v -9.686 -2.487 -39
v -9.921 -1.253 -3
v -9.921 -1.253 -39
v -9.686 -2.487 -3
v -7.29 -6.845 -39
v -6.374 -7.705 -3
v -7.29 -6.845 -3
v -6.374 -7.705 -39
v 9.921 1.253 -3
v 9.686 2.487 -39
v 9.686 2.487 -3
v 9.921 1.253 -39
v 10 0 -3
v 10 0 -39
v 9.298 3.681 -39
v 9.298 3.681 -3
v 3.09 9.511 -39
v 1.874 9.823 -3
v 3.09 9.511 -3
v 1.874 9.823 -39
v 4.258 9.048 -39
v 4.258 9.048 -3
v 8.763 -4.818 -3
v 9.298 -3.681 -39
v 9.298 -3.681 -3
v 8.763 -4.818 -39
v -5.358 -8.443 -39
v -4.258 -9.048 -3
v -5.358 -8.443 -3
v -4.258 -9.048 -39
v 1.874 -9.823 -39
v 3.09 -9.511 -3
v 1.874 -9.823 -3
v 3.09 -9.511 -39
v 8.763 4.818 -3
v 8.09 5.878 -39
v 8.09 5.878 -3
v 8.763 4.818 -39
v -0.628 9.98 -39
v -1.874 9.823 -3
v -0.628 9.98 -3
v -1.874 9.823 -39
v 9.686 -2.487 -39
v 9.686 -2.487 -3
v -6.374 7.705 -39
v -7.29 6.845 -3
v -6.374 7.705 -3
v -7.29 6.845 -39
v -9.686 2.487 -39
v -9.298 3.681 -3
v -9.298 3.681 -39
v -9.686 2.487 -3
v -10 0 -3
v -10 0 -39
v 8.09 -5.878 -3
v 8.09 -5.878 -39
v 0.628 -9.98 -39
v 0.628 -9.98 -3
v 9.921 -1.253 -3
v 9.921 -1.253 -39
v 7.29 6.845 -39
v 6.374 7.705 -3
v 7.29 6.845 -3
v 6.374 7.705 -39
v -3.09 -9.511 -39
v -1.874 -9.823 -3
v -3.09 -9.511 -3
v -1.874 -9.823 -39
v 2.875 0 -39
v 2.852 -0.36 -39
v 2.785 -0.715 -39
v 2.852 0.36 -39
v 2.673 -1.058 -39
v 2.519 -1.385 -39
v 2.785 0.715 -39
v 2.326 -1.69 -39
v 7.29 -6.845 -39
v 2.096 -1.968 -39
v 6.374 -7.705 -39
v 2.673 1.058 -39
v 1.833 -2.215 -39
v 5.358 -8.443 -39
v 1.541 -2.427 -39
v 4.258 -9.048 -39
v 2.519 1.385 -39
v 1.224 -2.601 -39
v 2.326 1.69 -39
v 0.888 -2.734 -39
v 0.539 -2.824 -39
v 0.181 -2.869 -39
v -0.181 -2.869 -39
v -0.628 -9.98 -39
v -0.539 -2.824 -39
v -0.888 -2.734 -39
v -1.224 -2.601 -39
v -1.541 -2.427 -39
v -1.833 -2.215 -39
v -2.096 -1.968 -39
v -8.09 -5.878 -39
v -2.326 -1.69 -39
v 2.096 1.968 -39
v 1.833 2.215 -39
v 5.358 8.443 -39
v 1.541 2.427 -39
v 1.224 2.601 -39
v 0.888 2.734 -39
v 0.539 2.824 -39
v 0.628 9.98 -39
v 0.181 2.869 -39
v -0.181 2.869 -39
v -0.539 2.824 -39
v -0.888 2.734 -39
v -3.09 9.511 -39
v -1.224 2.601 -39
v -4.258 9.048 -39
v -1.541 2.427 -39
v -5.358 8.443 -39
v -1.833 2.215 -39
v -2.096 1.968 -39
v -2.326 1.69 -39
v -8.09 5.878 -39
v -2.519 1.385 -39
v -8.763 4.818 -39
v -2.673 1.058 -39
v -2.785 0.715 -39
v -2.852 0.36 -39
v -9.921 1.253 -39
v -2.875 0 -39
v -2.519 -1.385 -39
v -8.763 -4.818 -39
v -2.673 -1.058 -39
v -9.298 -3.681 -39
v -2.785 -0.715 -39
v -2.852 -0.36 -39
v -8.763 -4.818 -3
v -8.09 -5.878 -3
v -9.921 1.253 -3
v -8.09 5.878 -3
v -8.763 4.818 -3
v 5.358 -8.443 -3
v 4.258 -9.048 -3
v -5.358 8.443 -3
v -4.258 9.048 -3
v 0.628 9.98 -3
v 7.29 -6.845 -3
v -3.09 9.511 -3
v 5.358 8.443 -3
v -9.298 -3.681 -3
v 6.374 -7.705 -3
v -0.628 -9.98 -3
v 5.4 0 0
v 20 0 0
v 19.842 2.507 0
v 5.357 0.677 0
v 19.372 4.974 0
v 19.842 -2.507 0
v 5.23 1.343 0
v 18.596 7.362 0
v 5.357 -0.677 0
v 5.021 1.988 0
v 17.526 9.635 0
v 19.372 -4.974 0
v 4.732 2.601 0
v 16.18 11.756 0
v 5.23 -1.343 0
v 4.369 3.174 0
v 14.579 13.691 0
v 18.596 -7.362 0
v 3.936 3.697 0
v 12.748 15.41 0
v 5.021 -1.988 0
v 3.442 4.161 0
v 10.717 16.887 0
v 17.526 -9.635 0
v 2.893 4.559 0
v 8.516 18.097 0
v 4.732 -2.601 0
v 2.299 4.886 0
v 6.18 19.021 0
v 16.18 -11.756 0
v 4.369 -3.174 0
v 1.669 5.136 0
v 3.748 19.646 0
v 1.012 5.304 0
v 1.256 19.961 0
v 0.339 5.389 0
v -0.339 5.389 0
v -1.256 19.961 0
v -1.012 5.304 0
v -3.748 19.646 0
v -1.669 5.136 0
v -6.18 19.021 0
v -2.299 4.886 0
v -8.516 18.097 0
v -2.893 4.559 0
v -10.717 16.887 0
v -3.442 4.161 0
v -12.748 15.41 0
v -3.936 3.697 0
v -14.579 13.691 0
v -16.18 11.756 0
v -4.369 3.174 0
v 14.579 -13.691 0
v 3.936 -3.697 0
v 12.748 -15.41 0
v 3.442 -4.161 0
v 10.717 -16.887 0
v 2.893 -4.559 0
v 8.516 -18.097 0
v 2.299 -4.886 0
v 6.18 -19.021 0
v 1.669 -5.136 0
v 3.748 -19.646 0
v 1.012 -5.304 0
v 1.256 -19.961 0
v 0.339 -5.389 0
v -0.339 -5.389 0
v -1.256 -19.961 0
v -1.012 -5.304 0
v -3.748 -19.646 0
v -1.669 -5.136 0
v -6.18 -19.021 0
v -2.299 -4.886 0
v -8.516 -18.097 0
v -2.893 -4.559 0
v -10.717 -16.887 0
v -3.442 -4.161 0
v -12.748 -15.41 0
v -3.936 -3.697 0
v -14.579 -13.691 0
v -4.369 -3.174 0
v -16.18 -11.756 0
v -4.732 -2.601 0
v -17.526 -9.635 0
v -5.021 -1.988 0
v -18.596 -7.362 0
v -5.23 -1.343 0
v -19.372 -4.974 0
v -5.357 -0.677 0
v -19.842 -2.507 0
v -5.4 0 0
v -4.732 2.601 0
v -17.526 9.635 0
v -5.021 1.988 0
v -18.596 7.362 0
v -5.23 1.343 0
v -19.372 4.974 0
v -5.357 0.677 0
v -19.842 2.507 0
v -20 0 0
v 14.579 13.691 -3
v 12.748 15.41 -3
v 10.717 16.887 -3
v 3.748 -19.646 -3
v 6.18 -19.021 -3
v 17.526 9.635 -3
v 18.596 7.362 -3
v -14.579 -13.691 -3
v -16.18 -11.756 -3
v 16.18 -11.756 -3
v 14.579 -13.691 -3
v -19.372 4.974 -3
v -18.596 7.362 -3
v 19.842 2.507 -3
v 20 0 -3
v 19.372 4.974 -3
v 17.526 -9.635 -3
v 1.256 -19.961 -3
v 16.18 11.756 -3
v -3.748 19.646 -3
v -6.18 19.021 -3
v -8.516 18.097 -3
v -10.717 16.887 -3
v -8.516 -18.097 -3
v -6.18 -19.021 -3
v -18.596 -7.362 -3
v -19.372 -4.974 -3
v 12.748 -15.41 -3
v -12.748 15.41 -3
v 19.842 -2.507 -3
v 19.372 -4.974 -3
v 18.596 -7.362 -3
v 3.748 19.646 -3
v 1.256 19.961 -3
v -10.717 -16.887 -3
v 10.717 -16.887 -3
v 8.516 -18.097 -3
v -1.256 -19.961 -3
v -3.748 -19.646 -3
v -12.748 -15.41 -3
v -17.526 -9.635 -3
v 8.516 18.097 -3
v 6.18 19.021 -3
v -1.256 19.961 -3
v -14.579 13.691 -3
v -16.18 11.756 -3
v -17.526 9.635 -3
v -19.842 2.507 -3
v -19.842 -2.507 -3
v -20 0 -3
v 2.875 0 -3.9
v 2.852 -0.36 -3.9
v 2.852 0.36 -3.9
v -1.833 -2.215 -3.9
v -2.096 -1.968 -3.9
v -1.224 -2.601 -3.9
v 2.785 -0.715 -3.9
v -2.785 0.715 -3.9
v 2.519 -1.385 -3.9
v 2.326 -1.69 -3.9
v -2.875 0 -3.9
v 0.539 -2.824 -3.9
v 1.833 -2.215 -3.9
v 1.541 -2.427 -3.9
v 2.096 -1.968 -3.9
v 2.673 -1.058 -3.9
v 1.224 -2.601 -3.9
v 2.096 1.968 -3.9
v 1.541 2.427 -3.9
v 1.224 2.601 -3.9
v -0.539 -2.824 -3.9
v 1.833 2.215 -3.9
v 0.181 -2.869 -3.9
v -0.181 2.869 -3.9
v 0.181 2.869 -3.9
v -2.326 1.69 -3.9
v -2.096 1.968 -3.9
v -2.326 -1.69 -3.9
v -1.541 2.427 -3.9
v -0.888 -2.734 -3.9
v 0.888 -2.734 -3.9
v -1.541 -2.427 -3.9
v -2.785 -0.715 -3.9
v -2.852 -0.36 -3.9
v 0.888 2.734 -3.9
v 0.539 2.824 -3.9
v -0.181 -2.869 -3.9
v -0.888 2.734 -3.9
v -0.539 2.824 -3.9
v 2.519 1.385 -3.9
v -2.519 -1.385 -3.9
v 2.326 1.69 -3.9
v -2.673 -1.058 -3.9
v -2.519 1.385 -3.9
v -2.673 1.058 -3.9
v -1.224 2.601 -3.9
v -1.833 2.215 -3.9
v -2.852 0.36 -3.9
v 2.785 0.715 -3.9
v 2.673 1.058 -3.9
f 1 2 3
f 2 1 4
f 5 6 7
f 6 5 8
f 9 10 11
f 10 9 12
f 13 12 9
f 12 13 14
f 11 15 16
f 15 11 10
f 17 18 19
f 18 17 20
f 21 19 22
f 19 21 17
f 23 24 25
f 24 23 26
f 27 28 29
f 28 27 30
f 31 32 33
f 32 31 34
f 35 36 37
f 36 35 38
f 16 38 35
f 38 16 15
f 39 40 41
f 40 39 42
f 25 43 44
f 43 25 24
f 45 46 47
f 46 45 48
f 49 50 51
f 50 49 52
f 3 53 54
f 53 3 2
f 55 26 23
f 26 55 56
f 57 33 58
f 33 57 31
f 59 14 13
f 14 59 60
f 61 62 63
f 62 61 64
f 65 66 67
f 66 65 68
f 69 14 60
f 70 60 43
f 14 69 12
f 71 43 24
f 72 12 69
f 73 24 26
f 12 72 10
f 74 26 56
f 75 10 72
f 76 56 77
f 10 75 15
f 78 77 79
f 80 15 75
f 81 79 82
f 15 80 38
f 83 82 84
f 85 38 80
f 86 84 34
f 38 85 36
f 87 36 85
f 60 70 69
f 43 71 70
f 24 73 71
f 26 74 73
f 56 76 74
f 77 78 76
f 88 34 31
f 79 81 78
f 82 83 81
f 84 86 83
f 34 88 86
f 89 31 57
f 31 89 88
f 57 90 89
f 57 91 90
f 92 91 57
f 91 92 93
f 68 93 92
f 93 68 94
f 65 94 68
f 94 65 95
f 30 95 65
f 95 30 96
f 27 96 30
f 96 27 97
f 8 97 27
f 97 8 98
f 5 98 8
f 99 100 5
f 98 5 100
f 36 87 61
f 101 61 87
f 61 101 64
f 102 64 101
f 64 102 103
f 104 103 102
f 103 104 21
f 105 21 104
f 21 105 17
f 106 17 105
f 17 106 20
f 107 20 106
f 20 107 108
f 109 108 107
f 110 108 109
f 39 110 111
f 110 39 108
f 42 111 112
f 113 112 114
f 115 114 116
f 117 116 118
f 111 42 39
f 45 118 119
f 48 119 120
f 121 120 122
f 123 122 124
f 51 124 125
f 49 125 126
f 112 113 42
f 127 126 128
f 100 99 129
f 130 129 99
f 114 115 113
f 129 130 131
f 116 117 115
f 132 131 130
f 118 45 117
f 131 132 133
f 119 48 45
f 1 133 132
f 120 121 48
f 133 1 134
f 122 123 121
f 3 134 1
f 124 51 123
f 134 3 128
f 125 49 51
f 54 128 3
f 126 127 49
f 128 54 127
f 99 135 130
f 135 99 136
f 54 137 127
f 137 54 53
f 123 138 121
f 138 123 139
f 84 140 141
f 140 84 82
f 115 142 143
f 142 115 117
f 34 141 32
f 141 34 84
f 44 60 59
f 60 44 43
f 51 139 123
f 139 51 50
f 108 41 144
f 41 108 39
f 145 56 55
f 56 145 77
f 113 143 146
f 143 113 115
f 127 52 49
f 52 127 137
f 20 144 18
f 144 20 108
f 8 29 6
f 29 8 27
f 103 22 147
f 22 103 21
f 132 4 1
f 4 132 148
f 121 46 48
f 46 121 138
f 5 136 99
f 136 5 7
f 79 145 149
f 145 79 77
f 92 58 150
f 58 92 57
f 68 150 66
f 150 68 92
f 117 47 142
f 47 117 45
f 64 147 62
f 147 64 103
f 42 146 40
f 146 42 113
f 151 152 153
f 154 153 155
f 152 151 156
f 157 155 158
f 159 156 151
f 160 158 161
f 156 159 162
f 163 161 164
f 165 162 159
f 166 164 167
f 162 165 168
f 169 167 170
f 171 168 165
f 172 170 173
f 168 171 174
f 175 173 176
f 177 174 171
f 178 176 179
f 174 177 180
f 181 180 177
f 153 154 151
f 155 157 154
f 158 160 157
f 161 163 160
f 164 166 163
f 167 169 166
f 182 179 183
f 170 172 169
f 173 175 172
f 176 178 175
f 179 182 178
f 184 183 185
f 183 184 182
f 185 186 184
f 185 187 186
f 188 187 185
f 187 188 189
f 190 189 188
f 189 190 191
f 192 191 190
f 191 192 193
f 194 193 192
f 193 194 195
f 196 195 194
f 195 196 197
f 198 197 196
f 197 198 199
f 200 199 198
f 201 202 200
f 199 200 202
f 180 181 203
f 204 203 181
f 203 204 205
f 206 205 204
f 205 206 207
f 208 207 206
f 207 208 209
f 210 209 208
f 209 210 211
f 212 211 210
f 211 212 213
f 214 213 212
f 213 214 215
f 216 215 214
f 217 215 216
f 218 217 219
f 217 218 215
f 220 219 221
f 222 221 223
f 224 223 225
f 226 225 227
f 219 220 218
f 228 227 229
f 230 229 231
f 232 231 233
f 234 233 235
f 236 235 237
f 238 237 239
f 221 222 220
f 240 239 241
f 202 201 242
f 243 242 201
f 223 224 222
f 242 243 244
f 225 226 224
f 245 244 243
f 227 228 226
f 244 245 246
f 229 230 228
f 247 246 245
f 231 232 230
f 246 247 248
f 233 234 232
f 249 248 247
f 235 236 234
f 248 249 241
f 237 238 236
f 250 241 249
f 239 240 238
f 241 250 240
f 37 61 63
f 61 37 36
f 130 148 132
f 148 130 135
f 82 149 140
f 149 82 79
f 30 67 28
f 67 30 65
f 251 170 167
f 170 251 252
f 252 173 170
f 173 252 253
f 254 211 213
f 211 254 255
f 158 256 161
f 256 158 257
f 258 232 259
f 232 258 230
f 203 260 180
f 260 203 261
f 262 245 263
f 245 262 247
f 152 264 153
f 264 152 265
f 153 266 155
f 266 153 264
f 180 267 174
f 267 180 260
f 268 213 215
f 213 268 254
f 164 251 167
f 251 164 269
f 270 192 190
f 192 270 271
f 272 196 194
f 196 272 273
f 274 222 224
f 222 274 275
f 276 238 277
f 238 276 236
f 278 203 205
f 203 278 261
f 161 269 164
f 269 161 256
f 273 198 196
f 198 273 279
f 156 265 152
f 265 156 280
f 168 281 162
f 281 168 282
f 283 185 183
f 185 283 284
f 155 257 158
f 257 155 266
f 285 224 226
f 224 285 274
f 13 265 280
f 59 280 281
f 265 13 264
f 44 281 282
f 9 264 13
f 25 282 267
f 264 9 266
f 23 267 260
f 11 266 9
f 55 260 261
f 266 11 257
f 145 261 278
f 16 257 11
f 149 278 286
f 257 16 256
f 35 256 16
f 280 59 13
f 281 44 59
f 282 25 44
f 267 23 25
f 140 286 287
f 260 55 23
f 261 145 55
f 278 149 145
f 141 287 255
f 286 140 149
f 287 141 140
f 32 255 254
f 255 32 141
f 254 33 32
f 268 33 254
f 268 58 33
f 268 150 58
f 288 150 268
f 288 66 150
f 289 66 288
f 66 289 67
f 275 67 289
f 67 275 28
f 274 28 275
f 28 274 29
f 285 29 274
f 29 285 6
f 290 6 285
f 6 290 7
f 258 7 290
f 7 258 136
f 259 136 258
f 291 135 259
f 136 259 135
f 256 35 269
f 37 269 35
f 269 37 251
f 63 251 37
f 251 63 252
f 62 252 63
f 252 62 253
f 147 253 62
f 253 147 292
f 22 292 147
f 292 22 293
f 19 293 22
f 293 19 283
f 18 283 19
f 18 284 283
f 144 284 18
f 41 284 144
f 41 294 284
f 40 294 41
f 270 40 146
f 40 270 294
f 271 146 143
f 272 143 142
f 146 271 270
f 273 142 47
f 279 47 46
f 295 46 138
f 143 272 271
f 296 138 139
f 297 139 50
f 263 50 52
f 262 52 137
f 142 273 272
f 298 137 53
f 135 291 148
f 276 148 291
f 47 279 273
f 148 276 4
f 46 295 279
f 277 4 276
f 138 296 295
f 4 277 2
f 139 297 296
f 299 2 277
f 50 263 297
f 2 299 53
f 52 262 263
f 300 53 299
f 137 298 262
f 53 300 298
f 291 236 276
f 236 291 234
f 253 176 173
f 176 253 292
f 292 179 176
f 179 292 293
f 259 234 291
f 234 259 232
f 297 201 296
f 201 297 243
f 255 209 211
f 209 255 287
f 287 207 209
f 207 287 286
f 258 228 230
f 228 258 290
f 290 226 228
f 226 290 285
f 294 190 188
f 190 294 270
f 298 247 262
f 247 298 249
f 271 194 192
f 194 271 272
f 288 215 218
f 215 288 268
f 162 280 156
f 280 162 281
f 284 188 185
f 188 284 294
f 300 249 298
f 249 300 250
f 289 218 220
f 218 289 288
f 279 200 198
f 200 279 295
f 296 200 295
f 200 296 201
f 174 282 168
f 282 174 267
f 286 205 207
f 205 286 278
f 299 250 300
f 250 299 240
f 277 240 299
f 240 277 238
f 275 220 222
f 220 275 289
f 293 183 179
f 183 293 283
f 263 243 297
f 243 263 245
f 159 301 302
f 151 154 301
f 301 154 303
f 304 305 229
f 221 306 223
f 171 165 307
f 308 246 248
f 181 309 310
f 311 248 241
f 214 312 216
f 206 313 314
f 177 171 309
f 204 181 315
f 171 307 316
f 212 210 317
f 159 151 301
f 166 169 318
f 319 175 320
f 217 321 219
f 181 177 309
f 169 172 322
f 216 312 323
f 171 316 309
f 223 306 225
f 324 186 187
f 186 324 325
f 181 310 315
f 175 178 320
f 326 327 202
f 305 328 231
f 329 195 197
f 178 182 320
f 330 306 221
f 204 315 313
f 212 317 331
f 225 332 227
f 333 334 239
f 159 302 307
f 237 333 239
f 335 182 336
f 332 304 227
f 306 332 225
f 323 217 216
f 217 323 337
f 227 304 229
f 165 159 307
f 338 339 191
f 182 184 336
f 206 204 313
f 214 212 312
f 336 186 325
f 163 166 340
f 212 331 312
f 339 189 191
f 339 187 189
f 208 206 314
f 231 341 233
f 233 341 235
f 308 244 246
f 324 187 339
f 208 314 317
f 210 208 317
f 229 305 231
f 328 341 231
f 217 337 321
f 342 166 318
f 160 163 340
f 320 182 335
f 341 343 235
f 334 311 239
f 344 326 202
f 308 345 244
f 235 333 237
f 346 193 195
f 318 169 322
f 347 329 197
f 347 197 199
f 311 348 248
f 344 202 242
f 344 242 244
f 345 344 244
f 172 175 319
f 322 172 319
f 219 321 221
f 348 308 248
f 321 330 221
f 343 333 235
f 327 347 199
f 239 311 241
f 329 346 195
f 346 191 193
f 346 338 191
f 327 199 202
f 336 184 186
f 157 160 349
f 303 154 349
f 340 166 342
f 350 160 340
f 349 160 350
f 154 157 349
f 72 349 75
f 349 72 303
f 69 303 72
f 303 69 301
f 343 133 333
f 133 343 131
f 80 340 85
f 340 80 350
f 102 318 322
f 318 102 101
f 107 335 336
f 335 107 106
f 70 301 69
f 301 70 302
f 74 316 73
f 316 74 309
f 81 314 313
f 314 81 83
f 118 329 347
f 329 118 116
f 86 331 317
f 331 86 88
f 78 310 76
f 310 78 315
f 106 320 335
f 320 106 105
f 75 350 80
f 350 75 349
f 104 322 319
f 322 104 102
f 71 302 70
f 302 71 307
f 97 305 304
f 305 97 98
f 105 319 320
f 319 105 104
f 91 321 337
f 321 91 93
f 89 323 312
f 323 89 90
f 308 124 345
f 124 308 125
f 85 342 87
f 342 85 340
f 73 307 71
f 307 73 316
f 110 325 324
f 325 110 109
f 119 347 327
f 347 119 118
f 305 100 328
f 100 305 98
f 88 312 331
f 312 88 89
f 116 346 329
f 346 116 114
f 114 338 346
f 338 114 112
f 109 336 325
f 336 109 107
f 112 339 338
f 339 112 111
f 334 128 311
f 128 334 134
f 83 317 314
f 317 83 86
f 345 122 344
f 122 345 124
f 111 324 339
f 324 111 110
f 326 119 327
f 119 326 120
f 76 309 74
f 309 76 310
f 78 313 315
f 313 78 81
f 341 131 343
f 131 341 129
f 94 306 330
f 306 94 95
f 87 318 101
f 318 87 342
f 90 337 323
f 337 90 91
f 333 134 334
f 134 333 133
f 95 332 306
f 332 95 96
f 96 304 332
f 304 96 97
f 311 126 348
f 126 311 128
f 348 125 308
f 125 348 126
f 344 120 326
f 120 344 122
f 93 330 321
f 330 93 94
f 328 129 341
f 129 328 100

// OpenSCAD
$fn = 50;


difference() {
	union() {
		translate(v = [0, 0, -39.0000000000]) {
			cylinder(h = 39, r = 10.0000000000);
		}
		translate(v = [0, 0, -3.0000000000]) {
			cylinder(h = 3, r = 20.0000000000);
		}
	}
	union() {
		translate(v = [0, 0, 0]) {
			rotate(a = [0, 0, 0]) {
				difference() {
					union() {
						#translate(v = [0, 0, -39.0000000000]) {
							cylinder(h = 39, r = 2.6000000000);
						}
						#translate(v = [0, 0, -3.9000000000]) {
							cylinder(h = 3.9000000000, r1 = 2.8750000000, r2 = 5.4000000000);
						}
						#translate(v = [0, 0, -39.0000000000]) {
							cylinder(h = 39, r = 2.8750000000);
						}
						#translate(v = [0, 0, -39.0000000000]) {
							cylinder(h = 39, r = 2.6000000000);
						}
					}
					union();
				}
			}
		}
	}
}
